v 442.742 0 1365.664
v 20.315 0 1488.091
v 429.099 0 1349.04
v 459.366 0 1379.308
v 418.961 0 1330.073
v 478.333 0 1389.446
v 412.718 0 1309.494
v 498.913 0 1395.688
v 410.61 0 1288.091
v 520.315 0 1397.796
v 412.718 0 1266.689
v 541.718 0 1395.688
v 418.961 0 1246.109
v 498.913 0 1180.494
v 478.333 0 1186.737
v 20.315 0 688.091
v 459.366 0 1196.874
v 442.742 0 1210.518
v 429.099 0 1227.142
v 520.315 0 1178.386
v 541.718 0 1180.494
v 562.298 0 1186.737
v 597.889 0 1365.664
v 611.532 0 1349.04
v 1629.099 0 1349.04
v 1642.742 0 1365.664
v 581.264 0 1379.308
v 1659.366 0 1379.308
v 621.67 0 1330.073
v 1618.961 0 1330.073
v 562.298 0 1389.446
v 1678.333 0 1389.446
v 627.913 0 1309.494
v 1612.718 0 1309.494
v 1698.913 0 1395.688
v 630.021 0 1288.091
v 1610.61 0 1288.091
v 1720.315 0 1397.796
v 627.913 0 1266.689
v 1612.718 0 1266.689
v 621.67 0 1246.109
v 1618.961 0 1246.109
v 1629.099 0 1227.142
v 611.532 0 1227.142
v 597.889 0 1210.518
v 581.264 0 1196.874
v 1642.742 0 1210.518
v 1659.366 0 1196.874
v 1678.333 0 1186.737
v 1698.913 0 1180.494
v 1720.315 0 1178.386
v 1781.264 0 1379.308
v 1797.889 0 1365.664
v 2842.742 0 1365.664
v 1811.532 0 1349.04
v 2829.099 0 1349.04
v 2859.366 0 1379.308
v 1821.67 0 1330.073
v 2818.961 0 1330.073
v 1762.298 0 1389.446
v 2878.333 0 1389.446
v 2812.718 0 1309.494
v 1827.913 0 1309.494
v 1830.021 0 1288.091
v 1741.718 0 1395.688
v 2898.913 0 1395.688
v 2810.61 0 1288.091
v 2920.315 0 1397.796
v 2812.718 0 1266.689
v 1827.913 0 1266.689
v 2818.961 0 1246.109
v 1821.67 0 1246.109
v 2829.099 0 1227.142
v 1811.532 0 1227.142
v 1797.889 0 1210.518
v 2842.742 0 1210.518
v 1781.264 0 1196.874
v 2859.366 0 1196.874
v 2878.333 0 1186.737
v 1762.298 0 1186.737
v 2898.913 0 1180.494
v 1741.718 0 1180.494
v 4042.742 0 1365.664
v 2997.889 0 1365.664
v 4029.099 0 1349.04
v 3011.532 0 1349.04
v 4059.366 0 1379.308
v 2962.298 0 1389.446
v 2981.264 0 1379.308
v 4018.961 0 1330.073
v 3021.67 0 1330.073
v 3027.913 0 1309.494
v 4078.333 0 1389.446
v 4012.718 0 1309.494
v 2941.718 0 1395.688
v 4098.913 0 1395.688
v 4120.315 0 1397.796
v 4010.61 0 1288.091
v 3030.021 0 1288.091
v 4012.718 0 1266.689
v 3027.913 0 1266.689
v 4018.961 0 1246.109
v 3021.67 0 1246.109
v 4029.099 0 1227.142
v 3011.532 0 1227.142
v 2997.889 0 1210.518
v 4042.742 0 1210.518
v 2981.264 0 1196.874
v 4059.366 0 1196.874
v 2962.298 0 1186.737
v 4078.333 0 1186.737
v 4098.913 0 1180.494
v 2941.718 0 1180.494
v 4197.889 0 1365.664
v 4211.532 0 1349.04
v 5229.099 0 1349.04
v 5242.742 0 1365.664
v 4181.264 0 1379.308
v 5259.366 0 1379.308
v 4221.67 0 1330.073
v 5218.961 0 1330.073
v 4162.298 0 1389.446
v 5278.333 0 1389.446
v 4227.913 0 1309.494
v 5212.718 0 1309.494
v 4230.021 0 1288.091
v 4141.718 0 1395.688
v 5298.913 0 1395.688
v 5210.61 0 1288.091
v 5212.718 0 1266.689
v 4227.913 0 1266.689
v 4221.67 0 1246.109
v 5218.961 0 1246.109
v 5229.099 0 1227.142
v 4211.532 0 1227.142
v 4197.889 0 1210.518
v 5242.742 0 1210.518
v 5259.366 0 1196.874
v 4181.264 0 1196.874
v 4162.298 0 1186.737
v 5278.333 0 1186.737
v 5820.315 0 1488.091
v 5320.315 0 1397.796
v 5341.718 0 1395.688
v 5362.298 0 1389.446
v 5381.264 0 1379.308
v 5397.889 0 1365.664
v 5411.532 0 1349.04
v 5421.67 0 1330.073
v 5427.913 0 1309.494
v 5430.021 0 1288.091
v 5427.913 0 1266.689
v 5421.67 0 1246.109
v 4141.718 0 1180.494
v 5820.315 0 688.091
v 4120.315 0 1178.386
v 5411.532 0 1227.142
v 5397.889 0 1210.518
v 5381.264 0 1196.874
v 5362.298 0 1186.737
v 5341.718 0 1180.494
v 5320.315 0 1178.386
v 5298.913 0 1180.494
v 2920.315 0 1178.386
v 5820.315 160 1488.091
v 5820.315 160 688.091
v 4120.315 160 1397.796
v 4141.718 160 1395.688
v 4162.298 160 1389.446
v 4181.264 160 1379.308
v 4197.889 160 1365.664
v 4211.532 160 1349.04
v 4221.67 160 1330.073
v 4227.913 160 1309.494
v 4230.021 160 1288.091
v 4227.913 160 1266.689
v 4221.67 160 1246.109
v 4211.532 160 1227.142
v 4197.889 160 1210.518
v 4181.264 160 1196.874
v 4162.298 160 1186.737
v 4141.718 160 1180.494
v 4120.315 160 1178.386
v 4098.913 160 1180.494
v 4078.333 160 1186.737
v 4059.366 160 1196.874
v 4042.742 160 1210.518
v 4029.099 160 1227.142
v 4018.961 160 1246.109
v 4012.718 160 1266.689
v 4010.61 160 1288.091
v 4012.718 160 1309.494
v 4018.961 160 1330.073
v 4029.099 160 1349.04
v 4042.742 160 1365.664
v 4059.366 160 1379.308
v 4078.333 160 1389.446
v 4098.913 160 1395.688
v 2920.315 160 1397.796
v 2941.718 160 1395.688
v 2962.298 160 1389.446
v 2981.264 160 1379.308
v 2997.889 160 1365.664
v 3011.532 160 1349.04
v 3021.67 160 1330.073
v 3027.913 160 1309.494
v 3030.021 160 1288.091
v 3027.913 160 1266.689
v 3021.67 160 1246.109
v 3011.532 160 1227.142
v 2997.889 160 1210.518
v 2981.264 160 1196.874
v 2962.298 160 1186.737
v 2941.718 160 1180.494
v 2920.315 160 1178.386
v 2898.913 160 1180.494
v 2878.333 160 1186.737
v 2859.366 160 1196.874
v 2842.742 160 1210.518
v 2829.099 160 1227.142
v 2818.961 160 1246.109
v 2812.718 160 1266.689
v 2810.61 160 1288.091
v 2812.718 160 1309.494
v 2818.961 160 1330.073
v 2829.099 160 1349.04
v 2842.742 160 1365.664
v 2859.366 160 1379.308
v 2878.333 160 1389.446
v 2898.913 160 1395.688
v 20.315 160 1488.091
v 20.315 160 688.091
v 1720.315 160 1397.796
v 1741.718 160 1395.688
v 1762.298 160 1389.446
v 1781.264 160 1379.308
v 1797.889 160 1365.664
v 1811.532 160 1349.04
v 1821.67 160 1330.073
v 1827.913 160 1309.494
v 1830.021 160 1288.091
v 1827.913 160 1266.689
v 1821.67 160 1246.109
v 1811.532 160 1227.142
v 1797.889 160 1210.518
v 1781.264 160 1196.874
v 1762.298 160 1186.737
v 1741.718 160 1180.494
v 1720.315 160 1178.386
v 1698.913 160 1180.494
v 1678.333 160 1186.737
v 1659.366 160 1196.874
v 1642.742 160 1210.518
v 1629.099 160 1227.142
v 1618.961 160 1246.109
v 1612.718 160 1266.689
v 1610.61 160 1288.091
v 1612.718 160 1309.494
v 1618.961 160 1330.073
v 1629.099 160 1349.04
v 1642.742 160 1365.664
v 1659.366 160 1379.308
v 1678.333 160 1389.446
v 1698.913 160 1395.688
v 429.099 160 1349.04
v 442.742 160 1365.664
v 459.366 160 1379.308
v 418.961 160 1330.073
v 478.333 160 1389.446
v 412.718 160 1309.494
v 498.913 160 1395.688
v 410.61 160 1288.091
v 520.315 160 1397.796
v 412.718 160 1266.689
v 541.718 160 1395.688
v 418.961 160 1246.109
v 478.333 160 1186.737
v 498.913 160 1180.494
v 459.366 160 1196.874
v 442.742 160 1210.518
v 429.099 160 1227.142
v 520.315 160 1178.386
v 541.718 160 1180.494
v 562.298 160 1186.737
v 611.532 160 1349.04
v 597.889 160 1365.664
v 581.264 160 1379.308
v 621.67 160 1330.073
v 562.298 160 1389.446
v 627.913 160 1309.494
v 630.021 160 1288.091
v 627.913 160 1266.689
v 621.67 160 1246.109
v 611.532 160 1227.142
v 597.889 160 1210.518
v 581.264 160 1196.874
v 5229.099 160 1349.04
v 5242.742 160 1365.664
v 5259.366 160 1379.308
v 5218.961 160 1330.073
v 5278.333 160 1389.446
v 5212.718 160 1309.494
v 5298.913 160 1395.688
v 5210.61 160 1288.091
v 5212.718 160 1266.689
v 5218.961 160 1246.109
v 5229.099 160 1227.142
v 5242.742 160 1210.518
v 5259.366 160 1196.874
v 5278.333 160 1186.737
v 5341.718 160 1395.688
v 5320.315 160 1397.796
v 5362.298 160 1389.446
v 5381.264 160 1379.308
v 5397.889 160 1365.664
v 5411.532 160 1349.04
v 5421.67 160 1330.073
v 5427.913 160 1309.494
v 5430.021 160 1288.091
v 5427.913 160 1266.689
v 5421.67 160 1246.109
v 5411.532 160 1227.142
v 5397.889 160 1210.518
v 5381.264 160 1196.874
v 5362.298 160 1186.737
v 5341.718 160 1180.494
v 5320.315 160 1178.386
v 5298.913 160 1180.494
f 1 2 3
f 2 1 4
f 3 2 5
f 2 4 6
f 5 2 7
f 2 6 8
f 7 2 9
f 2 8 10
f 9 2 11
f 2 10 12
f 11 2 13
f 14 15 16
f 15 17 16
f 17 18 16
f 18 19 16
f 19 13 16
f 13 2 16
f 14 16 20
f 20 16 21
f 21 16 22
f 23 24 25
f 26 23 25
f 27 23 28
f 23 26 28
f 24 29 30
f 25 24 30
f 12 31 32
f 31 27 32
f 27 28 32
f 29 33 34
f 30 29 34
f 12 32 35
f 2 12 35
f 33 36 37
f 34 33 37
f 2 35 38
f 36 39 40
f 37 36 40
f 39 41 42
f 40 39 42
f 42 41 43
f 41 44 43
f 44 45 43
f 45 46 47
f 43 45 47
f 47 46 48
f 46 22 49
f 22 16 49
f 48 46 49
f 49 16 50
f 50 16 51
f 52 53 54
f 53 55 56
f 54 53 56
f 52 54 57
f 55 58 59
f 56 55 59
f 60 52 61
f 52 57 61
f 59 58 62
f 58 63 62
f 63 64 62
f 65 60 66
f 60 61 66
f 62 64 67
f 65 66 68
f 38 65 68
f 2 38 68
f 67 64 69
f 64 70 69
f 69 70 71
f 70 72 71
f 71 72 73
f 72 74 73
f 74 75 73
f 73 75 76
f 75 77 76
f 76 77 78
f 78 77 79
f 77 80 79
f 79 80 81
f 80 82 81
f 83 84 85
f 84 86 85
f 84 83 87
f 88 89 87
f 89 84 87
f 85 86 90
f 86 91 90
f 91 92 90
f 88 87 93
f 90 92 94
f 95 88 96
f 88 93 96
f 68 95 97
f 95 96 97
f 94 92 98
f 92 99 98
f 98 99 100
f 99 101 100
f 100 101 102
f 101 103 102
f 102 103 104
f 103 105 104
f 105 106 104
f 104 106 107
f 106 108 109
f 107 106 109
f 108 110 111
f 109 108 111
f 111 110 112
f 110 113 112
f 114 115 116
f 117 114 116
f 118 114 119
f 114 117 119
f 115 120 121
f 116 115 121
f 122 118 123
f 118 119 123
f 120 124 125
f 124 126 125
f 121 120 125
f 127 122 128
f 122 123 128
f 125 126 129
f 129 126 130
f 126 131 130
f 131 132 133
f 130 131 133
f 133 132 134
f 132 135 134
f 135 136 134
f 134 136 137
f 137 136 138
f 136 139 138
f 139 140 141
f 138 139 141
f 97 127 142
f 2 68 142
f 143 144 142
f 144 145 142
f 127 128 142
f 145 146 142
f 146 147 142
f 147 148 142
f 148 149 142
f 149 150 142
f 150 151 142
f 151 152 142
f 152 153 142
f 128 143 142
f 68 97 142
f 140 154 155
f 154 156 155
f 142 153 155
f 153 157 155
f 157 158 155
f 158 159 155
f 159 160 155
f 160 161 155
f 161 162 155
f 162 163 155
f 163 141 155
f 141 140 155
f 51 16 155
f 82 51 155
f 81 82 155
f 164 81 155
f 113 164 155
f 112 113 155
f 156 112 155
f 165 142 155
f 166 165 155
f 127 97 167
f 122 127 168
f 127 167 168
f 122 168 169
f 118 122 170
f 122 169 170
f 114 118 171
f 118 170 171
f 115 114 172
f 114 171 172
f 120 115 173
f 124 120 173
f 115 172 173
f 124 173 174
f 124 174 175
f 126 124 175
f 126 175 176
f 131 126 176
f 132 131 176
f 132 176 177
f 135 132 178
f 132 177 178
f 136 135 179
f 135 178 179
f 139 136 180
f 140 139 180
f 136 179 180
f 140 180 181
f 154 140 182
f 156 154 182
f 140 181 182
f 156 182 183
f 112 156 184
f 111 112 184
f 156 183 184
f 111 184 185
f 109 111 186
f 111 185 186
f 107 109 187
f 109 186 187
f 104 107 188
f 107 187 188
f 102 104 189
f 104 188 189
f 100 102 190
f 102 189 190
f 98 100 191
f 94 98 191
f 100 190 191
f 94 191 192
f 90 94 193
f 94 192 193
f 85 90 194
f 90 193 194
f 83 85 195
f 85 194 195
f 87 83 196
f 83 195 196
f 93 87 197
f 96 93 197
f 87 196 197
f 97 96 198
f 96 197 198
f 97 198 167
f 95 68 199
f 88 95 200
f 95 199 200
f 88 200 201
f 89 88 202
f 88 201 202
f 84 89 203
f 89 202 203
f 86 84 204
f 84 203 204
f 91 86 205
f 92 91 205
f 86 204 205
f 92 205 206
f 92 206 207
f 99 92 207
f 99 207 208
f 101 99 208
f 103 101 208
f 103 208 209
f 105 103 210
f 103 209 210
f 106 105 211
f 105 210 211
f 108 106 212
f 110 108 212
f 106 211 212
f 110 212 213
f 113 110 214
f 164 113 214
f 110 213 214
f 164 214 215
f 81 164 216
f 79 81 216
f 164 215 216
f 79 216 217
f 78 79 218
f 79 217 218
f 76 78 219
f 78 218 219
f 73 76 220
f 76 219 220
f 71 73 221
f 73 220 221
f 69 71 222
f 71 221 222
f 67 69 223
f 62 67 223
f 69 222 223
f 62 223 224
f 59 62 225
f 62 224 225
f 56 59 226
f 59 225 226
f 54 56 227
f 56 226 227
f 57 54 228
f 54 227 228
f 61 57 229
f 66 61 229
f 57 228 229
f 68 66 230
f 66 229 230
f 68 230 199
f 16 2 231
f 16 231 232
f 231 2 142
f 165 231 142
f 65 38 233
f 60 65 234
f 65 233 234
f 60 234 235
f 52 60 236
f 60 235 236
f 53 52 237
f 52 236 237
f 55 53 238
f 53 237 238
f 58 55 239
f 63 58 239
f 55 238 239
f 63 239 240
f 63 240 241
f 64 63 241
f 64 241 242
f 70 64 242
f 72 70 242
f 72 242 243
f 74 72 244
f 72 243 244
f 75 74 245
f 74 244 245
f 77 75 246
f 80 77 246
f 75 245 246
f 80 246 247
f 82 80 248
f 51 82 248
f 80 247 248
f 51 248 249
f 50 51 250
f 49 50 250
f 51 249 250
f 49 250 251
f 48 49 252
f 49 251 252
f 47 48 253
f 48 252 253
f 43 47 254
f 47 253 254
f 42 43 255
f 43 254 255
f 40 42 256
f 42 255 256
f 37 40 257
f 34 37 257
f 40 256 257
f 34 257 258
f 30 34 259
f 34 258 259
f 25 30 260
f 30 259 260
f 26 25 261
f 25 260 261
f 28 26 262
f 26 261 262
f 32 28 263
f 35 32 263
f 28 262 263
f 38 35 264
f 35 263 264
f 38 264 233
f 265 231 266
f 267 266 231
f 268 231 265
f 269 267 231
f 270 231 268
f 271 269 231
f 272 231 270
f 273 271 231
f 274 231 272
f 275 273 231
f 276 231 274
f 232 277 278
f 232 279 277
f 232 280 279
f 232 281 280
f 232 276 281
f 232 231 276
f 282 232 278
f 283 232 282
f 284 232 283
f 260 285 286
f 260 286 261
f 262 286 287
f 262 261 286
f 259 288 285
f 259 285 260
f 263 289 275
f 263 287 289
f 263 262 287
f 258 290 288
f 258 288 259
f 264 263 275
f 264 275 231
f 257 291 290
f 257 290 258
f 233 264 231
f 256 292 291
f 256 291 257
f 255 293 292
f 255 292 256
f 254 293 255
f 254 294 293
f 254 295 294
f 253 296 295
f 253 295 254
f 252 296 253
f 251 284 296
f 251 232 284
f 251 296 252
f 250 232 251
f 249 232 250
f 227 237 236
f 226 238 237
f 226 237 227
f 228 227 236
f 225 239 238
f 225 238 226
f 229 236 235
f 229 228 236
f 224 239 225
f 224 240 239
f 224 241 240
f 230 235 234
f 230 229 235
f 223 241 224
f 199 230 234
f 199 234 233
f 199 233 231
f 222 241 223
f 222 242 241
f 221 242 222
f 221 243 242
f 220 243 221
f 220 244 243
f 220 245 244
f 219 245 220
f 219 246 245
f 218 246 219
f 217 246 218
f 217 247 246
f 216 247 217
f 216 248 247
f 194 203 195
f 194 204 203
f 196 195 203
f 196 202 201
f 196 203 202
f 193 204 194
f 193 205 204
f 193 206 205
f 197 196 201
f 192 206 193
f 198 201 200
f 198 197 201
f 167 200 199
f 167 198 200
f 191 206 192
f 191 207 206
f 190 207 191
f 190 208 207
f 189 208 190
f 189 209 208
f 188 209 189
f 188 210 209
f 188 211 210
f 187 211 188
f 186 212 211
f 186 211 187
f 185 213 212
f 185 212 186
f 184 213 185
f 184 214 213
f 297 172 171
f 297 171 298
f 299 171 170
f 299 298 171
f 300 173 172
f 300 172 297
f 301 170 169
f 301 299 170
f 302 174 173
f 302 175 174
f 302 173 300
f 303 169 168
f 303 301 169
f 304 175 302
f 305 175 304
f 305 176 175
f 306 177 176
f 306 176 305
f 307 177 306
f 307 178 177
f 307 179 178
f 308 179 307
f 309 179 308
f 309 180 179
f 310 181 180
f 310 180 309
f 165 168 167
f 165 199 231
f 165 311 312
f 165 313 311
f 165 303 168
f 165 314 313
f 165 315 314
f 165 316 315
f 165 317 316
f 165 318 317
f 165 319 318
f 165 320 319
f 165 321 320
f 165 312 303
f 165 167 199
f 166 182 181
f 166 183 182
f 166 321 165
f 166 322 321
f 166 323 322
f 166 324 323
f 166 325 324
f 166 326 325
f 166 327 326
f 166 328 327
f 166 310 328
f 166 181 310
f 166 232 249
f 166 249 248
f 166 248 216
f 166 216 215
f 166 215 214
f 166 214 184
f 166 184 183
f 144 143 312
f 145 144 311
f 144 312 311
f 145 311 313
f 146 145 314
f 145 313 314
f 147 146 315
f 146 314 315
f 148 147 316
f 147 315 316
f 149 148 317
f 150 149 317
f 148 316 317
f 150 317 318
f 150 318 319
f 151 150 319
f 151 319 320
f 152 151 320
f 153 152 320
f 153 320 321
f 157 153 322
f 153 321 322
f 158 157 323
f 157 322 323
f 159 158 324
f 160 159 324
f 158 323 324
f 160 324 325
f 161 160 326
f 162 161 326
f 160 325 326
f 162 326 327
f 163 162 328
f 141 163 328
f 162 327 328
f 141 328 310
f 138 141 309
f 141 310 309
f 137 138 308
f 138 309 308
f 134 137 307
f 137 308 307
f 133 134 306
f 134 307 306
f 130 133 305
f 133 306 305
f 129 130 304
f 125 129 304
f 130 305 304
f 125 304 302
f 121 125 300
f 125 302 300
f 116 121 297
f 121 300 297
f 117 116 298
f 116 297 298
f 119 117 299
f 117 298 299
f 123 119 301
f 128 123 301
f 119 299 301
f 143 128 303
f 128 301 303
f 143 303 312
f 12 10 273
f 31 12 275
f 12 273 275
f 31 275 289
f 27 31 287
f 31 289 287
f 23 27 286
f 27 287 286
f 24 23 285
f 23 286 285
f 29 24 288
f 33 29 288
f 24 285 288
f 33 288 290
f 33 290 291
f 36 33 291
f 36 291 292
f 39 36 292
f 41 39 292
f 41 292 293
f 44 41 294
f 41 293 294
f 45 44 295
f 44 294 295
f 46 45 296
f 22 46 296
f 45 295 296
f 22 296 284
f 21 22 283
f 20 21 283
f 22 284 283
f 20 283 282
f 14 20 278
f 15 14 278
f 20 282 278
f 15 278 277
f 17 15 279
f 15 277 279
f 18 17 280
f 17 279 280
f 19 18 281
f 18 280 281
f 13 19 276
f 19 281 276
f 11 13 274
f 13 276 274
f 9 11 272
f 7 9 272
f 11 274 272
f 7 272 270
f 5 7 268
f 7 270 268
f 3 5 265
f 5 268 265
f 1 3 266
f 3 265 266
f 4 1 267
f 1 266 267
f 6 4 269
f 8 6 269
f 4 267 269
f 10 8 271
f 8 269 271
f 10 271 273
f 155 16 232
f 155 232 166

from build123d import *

# Parameters (mm, degrees)
SKETCH1_W           = 5800
SKETCH1_H           = 800
BOSS_EXTRUDE1_DEPTH = 160
SKETCH2_R           = 109.705286938
CUT_EXTRUDE1_DEPTH  = 160
LPATTERN1_COUNT     = 5
LPATTERN1_PITCH     = 1200


with BuildPart() as part:
    # Sketch1 → Boss-Extrude1 (new body)
    with BuildSketch(Plane(origin=(0, 0, 0), x_dir=(1, 0, 0), z_dir=(0, 1, 0))):
        with Locations((2920.315236427, -1088.091068301)):
            Rectangle(SKETCH1_W, SKETCH1_H)
    extrude(amount=BOSS_EXTRUDE1_DEPTH)

    # Sketch2 → Cut-Extrude1 (cut)
    with BuildSketch(Plane(origin=(0, 160, 0), x_dir=(1, 0, 0), z_dir=(0, 1, 0))):
        with Locations(Location((520.315236427, -1288.091068301, 0), (0, 0, 270))):  # turned: the seam where the file's is
            Circle(SKETCH2_R)
    cut_extrude1 = extrude(amount=-CUT_EXTRUDE1_DEPTH, mode=Mode.SUBTRACT)

    # LPattern1: Cut-Extrude1 ×5
    with Locations(*[(i * LPATTERN1_PITCH, 0, 0) for i in range(1, LPATTERN1_COUNT)]):
        add(cut_extrude1, mode=Mode.SUBTRACT)


solid = part.part
